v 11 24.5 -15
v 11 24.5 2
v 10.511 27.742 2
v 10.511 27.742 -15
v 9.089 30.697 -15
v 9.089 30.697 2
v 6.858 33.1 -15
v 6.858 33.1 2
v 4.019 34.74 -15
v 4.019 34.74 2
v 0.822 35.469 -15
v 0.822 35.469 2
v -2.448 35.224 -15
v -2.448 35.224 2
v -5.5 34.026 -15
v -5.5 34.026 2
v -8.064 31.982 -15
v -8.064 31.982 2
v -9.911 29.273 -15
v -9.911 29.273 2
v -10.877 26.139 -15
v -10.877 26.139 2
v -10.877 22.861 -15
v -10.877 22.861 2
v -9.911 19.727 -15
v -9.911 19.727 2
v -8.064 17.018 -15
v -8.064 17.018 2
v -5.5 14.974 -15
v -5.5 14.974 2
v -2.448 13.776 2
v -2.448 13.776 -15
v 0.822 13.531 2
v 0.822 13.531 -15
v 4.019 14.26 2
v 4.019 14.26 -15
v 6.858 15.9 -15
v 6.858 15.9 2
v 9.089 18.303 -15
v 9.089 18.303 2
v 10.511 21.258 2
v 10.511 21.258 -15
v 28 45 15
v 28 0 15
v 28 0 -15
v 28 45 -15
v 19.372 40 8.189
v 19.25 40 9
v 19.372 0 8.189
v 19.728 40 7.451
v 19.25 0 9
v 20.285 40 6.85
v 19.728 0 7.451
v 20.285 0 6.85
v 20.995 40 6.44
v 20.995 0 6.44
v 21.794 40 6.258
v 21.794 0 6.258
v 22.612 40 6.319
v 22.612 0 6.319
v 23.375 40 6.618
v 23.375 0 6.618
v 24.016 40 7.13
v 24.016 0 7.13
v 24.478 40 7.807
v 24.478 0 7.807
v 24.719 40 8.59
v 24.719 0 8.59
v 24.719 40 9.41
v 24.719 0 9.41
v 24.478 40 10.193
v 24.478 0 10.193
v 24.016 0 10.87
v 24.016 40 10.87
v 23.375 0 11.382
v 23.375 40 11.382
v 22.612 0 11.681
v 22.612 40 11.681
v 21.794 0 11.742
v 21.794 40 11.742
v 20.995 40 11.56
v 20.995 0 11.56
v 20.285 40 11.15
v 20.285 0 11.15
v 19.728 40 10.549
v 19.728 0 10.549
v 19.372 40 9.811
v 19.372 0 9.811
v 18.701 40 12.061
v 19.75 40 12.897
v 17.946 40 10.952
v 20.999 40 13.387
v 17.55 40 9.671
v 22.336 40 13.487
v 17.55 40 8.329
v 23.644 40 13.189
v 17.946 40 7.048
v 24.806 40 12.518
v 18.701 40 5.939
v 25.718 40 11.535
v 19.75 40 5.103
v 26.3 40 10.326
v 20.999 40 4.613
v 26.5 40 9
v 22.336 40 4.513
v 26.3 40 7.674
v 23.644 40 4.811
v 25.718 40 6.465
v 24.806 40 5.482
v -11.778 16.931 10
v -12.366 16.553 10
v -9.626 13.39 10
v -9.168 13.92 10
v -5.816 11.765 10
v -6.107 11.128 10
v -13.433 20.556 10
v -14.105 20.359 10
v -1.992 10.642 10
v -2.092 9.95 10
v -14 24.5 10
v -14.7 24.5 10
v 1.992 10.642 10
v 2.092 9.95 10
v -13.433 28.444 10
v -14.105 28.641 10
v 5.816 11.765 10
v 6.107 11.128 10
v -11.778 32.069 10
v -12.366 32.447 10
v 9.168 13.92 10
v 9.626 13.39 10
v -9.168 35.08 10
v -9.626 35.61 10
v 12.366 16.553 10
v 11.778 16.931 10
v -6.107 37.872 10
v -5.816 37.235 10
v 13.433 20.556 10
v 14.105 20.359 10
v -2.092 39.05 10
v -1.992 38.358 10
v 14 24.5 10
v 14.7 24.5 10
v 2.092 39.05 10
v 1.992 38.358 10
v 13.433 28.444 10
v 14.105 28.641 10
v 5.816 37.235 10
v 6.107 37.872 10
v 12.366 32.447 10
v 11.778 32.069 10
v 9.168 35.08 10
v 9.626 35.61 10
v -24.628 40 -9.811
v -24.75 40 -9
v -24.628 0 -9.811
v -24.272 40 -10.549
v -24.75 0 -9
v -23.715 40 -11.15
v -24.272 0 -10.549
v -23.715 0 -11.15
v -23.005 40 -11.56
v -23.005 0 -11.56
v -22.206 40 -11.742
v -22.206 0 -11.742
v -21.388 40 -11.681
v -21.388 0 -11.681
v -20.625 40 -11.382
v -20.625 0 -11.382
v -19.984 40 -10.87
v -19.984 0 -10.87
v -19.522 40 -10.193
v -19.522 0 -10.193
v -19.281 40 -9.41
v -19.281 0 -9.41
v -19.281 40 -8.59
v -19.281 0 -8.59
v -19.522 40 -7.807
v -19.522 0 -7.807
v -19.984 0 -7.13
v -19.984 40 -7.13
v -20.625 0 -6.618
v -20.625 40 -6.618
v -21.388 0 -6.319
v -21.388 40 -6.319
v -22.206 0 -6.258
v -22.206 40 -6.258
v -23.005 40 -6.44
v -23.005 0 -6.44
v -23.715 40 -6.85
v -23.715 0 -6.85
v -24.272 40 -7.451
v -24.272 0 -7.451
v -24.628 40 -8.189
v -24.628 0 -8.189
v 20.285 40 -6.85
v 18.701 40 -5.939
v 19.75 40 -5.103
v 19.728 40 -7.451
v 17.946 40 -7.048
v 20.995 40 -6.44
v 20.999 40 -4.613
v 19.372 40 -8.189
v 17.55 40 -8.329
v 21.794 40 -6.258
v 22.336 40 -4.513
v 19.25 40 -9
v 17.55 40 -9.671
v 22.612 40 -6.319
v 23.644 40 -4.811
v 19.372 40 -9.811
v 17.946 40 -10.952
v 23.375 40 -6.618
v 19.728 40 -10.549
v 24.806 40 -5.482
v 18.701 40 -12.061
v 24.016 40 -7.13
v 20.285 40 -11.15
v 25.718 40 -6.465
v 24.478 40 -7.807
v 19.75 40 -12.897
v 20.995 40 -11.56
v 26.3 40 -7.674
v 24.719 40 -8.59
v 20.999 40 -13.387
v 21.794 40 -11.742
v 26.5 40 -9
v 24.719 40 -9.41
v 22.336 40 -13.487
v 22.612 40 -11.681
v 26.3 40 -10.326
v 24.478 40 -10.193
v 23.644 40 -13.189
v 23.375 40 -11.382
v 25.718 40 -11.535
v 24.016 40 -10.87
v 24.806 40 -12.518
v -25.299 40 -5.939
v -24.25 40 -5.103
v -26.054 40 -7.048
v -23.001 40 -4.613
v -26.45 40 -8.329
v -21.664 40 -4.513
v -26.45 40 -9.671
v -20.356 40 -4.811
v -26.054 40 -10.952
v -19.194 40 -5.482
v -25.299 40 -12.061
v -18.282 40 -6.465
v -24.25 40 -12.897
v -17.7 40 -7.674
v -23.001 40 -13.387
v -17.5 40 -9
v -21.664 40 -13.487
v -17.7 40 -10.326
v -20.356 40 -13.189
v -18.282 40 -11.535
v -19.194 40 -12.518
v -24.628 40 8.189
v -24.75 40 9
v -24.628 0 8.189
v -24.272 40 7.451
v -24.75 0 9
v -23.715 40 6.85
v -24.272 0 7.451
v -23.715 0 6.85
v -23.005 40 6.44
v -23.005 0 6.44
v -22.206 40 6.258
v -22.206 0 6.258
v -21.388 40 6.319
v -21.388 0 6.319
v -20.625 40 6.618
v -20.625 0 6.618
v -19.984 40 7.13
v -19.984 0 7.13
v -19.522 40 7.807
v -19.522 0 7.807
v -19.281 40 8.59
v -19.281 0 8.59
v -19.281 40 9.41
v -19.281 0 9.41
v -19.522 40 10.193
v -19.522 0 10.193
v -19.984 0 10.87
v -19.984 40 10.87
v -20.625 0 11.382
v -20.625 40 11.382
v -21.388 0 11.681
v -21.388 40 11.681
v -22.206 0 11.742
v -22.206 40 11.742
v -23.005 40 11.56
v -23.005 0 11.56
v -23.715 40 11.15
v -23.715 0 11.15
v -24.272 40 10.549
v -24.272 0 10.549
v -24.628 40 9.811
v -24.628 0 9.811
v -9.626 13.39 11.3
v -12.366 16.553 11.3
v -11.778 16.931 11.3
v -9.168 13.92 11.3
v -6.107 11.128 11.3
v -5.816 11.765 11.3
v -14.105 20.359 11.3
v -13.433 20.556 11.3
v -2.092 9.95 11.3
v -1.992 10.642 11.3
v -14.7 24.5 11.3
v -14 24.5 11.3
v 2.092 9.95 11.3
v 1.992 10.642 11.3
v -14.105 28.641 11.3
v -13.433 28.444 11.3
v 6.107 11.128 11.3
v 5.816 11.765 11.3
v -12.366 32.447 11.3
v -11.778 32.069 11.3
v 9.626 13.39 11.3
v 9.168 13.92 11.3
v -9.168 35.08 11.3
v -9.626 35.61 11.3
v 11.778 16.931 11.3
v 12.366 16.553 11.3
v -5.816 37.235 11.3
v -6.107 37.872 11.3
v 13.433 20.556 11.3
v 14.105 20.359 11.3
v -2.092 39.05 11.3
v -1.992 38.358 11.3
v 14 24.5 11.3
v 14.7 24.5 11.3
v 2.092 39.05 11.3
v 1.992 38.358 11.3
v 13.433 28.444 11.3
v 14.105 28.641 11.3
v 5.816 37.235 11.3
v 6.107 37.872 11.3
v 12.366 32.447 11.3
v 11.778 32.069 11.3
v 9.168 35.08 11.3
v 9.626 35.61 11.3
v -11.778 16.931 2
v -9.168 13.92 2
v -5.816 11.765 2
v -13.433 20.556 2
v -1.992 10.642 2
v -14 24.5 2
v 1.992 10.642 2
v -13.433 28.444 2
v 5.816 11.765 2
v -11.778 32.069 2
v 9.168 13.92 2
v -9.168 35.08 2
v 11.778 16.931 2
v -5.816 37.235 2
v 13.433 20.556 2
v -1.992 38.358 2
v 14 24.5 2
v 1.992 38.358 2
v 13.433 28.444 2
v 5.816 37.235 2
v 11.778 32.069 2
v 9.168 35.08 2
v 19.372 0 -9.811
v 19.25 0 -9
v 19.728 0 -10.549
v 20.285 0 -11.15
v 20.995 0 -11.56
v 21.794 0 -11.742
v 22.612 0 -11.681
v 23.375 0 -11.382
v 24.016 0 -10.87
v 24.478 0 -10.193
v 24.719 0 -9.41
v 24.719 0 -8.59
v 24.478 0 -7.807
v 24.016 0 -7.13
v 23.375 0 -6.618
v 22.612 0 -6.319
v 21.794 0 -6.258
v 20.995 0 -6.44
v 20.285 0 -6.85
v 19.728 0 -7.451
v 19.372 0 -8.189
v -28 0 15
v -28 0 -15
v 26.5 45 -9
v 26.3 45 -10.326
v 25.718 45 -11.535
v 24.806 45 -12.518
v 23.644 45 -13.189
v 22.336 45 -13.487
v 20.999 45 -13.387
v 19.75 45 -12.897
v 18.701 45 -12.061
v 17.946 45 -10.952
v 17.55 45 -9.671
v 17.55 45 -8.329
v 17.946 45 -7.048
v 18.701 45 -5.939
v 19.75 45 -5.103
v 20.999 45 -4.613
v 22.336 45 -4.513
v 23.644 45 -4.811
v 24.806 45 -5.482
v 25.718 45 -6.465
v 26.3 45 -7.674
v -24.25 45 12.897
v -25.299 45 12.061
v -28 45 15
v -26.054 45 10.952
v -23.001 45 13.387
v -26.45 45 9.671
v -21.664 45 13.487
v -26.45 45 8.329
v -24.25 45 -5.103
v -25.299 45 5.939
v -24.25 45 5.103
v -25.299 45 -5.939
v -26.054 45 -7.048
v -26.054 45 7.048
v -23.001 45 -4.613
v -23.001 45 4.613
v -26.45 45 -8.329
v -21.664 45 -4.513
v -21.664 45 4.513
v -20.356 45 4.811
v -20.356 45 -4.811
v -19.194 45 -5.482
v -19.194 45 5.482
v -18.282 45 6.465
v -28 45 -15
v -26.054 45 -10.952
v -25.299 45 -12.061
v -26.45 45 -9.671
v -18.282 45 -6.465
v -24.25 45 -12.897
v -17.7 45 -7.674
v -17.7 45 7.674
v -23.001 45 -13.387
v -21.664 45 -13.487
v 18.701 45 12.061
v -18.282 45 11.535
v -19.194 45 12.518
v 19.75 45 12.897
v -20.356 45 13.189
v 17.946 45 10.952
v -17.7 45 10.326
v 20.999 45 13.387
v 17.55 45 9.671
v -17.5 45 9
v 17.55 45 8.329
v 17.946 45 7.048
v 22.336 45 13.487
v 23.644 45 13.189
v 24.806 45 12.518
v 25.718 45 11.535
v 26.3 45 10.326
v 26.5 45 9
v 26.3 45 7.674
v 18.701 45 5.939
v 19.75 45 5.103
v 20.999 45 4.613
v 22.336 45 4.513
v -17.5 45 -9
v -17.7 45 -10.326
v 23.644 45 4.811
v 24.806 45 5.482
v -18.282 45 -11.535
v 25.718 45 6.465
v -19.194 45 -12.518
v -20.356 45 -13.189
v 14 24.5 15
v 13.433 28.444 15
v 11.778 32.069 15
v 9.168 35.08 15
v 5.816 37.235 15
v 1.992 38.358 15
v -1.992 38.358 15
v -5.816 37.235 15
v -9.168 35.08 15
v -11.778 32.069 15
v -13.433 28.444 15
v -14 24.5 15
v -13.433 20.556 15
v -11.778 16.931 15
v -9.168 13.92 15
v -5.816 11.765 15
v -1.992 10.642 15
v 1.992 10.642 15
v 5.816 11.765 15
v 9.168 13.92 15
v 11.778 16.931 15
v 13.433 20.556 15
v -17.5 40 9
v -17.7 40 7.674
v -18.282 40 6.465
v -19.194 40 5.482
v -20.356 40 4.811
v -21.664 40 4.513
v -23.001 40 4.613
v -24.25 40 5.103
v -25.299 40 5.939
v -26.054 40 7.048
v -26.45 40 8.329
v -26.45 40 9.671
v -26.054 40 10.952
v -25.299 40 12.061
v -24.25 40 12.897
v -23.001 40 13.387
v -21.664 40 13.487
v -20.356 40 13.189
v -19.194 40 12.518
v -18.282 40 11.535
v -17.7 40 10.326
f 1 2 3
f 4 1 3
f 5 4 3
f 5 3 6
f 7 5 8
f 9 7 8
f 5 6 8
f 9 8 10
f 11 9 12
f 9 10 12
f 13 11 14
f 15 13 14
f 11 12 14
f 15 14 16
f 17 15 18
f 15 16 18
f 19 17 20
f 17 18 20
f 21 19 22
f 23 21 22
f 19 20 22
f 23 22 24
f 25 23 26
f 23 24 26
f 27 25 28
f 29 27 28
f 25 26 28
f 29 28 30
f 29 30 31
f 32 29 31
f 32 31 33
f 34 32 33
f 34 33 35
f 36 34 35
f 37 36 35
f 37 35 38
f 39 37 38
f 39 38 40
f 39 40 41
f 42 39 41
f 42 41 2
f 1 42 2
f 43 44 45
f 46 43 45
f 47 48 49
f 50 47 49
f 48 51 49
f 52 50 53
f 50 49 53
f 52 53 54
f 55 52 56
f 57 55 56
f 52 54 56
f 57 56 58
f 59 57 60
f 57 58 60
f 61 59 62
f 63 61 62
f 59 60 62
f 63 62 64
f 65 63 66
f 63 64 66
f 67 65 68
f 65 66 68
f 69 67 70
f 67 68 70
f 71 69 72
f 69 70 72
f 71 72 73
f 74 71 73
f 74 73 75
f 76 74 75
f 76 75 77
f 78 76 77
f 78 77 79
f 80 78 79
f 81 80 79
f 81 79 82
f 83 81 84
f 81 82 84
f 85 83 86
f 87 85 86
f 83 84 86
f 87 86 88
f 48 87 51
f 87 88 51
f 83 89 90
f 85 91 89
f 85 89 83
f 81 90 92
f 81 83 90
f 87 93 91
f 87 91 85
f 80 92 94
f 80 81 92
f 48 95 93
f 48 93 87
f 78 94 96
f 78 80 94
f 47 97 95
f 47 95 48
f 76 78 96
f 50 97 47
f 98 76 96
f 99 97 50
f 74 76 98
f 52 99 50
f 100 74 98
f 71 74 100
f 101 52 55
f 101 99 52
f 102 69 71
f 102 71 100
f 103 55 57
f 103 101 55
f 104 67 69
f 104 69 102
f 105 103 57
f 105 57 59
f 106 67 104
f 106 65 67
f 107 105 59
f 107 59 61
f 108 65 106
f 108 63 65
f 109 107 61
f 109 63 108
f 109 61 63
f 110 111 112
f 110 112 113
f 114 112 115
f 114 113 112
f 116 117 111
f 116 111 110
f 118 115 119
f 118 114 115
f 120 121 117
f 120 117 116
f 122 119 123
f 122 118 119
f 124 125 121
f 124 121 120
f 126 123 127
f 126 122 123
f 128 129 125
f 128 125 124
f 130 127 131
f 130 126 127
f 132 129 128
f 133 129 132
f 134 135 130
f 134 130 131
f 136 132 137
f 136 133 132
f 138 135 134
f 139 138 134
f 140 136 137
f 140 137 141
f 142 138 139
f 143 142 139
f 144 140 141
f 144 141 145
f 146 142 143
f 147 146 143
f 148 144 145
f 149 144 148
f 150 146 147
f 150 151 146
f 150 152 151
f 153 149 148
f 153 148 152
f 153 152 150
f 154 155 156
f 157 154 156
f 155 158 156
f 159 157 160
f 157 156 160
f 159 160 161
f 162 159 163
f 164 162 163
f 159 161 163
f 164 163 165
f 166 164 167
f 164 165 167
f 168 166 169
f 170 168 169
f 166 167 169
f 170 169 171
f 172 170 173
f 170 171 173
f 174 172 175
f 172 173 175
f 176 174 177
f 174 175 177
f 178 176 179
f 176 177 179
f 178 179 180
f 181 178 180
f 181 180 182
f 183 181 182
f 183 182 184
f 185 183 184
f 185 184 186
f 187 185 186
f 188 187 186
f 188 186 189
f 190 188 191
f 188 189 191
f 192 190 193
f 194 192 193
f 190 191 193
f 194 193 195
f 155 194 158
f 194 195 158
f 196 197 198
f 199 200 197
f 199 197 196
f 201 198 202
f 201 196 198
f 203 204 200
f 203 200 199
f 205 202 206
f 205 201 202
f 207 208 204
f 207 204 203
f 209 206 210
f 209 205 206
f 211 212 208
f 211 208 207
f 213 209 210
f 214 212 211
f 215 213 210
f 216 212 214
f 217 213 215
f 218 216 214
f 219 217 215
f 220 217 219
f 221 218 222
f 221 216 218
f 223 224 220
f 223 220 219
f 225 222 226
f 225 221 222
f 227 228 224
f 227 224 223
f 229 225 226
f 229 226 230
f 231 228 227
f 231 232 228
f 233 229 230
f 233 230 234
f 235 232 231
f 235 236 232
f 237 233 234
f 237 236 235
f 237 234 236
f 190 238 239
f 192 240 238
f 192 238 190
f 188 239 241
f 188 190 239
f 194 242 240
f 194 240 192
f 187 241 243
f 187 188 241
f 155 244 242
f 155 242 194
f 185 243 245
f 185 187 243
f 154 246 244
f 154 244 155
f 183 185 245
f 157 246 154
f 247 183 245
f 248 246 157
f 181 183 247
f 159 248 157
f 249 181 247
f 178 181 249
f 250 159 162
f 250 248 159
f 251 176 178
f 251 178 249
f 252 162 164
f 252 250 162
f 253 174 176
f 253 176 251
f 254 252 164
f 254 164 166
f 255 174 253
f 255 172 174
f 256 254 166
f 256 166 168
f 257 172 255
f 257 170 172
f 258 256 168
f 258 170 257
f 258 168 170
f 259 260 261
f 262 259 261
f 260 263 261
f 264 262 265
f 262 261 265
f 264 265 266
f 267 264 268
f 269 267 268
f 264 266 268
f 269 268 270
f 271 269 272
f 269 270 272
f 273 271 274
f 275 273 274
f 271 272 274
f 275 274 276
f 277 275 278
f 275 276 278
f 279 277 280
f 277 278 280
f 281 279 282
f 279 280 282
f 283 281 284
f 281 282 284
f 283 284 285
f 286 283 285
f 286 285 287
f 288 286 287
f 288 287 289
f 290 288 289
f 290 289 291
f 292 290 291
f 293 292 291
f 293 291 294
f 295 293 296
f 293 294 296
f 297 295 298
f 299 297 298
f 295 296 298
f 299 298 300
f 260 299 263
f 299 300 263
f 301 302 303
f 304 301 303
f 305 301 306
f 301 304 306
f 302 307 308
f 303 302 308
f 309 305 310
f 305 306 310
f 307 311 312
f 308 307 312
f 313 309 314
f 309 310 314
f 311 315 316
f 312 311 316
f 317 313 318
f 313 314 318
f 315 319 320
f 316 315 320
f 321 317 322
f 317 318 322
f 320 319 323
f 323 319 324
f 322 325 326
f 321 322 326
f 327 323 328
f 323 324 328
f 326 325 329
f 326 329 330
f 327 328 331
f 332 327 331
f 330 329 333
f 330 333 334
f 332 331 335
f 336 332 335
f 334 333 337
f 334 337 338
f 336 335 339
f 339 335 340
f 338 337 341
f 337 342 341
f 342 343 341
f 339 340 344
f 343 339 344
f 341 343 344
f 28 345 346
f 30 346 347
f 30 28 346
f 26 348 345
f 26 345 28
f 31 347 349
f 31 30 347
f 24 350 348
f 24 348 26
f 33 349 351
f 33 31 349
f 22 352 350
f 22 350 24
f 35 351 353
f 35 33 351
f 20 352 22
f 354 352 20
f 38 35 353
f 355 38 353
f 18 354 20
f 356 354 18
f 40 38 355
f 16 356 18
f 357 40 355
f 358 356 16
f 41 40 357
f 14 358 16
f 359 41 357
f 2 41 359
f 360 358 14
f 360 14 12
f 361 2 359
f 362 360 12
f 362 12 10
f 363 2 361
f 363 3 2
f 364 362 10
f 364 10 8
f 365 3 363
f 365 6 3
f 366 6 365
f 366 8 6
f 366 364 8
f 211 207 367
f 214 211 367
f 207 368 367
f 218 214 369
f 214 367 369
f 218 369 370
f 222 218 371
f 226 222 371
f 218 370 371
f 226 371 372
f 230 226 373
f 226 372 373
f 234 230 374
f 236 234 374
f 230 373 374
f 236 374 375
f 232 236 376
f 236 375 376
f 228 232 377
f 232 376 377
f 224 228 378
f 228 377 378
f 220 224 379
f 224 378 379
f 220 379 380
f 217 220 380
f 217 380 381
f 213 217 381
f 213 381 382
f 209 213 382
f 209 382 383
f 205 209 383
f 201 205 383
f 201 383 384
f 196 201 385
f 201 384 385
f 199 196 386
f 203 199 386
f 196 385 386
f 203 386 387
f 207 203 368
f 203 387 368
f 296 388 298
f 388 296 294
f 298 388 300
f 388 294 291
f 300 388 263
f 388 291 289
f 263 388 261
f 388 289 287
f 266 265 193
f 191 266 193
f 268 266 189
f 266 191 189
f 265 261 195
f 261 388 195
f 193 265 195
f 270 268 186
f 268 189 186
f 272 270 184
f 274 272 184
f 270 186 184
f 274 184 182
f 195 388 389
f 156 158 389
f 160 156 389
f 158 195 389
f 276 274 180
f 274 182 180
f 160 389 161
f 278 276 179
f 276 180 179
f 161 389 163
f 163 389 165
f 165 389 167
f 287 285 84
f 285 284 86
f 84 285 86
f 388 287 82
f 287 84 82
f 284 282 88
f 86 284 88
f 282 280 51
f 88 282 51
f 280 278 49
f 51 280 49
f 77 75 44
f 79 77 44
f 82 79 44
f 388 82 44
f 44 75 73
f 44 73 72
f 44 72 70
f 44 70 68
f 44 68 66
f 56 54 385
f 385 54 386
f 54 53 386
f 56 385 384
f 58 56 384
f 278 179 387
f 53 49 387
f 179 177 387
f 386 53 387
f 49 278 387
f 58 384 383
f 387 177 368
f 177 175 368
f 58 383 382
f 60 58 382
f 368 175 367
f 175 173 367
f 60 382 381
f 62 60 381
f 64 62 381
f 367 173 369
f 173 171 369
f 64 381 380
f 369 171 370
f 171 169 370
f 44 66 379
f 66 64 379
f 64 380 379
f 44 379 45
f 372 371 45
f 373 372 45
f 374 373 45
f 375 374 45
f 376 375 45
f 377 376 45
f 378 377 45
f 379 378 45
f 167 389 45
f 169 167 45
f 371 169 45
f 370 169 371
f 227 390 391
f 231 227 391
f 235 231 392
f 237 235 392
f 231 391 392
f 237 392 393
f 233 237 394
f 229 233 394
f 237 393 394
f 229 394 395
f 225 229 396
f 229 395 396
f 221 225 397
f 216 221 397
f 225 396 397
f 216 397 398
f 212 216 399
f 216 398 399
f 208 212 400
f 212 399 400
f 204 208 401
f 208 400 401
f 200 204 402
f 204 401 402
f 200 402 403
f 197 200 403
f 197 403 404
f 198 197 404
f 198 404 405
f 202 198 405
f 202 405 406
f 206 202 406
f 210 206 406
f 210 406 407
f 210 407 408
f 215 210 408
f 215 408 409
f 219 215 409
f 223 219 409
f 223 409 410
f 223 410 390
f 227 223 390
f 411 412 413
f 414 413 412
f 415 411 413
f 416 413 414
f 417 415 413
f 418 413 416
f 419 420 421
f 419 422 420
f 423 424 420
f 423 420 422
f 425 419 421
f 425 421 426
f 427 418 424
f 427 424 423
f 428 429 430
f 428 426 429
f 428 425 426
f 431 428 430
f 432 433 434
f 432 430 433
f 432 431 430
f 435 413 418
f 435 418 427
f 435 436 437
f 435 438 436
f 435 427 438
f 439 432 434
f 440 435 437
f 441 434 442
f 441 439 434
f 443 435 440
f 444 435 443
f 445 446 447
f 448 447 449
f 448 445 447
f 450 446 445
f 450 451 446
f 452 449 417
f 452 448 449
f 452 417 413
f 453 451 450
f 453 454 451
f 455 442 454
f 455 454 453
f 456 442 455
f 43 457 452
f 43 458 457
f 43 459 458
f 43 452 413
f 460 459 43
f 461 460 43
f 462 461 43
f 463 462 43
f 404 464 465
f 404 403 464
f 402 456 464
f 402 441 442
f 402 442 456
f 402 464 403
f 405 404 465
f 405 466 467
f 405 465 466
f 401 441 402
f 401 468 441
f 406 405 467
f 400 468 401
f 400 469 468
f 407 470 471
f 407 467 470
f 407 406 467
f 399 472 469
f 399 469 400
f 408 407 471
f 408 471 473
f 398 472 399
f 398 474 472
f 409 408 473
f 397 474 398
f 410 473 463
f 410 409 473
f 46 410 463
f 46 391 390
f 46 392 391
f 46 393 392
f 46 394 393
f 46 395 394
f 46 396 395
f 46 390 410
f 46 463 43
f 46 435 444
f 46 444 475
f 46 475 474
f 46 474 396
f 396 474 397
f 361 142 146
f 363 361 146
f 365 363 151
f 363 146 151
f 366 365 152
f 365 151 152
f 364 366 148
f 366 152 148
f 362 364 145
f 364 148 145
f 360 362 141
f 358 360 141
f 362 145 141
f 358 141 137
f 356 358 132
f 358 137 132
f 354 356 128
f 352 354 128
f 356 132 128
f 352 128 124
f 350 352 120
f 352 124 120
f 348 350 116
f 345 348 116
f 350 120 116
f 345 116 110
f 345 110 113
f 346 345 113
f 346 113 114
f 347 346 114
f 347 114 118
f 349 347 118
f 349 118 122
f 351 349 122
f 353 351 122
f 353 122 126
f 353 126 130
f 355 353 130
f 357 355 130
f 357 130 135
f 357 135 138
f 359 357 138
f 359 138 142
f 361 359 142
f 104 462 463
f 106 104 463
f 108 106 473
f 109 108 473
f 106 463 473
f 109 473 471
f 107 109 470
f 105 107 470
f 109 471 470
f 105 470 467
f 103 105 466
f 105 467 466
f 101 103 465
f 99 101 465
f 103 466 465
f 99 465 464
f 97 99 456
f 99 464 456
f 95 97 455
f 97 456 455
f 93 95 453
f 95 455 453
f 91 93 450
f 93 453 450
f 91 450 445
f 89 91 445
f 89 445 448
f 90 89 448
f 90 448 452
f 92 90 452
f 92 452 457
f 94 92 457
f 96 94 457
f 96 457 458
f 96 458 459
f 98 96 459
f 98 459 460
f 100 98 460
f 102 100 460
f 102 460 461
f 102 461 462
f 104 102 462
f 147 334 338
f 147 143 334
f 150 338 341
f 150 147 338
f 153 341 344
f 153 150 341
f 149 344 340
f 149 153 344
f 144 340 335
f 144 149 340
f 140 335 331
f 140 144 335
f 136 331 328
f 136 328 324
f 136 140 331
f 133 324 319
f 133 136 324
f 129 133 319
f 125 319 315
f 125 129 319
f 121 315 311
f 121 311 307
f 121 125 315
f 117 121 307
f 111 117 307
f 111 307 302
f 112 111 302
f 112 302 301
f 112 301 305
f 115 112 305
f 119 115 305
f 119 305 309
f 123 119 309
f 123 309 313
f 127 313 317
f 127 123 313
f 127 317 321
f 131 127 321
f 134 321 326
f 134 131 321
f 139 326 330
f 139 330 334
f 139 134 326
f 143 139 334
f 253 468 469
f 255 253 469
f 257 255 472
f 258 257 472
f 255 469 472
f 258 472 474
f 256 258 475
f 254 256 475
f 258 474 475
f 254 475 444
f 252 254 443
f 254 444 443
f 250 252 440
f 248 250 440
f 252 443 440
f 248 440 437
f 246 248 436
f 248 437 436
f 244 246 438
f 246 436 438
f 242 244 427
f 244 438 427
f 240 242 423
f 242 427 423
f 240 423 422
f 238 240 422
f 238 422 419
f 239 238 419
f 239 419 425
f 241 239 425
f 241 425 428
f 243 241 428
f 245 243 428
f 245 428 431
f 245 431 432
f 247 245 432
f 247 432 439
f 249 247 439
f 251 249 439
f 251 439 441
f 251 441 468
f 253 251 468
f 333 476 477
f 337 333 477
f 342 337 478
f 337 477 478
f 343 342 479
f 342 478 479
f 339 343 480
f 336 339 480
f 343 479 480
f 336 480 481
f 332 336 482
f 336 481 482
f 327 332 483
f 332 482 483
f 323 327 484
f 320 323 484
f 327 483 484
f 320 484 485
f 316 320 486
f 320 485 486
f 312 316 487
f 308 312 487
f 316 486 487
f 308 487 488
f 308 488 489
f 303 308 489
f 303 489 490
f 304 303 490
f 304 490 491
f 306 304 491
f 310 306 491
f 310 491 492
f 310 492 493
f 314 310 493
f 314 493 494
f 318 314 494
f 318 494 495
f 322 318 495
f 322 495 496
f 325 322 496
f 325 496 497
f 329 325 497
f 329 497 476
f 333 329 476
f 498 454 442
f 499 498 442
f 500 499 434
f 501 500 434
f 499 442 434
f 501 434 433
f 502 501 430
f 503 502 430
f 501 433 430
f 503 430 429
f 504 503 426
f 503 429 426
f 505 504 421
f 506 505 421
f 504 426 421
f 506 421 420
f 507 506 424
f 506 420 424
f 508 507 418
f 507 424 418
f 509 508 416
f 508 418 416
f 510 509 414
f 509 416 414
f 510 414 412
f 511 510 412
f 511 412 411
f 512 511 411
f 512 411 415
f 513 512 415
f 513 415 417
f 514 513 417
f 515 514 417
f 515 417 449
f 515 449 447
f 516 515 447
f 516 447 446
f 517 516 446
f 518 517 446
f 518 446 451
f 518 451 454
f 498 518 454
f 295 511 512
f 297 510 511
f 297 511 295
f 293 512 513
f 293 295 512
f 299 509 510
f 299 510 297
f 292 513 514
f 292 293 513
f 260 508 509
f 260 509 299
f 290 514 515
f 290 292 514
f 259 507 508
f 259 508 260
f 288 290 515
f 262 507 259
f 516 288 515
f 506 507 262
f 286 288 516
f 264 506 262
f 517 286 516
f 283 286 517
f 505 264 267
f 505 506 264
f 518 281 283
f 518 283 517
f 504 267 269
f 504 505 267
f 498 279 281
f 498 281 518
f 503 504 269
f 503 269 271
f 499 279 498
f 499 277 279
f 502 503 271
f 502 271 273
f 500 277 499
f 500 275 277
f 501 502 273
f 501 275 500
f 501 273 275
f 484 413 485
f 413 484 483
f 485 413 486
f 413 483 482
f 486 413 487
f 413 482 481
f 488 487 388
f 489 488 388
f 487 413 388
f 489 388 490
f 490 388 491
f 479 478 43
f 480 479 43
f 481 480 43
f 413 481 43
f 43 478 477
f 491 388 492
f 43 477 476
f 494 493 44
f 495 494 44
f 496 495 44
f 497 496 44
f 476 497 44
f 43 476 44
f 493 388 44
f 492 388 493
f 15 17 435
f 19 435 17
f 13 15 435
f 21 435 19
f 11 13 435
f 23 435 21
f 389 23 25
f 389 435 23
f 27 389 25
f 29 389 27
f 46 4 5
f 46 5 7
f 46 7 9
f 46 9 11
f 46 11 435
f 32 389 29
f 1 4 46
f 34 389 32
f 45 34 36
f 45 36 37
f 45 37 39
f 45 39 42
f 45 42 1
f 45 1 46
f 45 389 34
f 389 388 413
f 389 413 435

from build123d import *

# Parameters (mm, degrees)
SZKIC1_W                                             = 56
SZKIC1_H                                             = 30
DODANIE_WYCI_GNI_CIE1_DEPTH                          = 45
SZKIC3_R                                             = 11
WYTNIJ_WYCI_GNI_CIE2_DEPTH                           = 61.901559914
SZKIC4_R                                             = 14
WYTNIJ_WYCI_GNI_CIE3_DEPTH                           = 13
POG_BIENIE_WALCOWE_POD_M5_WKR_T_DO_CZ_CI_D           = 5.5
POG_BIENIE_WALCOWE_POD_M5_WKR_T_DO_CZ_CI_CBORE_D     = 9
POG_BIENIE_WALCOWE_POD_M5_WKR_T_DO_CZ_CI_CBORE_DEPTH = 5
SZKIC5_W                                             = 1.3
SZKIC5_H                                             = 0.7


with BuildPart() as part:
    # Szkic1 → Dodanie-wyciągnięcie1 (new body)
    with BuildSketch(Plane(origin=(0, 0, 0), x_dir=(1, 0, 0), z_dir=(0, 1, 0))):
        Rectangle(SZKIC1_W, SZKIC1_H)
    extrude(amount=DODANIE_WYCI_GNI_CIE1_DEPTH)

    # Szkic3 → Wytnij-wyciągnięcie2 (cut, through all)
    with BuildSketch(Plane.XY.offset(15)):
        with Locations((0, 24.5)):
            Circle(SZKIC3_R)
    extrude(amount=-WYTNIJ_WYCI_GNI_CIE2_DEPTH, mode=Mode.SUBTRACT)

    # Szkic4 → Wytnij-wyciągnięcie3 (cut)
    with BuildSketch(Plane.XY.offset(15)):
        with Locations((0, 24.5)):
            Circle(SZKIC4_R)
    extrude(amount=-WYTNIJ_WYCI_GNI_CIE3_DEPTH, mode=Mode.SUBTRACT)

    # Pogłębienie walcowe pod M5 Wkręt do części metalowych z łbem sześciokątnym1 (through all)
    with Locations(Plane(origin=(0, 45, 0), x_dir=(1, 0, 0), z_dir=(0, 1, 0))):
        with Locations((22, 9), (22, -9), (-22, -9), (-22, 9)):
            CounterBoreHole(POG_BIENIE_WALCOWE_POD_M5_WKR_T_DO_CZ_CI_D / 2, POG_BIENIE_WALCOWE_POD_M5_WKR_T_DO_CZ_CI_CBORE_D / 2, POG_BIENIE_WALCOWE_POD_M5_WKR_T_DO_CZ_CI_CBORE_DEPTH)

    # Szkic5 → Wycięcie-obrót1 (revolve, cut)
    with BuildSketch(Plane(origin=(0, 0, 0), x_dir=(0, 0, -1), z_dir=(1, 0, 0)), mode=Mode.PRIVATE) as wyci_cie_obr_t1_sk:
        with Locations((-10.65, 10.15)):
            Rectangle(SZKIC5_W, SZKIC5_H)
    revolve(wyci_cie_obr_t1_sk.sketch.rotate(Axis((0, 24.5, 9.294649117), (0, 0, 1)), 90), axis=Axis((0, 24.5, 9.294649117), (0, 0, 1)), mode=Mode.SUBTRACT)


solid = part.part
